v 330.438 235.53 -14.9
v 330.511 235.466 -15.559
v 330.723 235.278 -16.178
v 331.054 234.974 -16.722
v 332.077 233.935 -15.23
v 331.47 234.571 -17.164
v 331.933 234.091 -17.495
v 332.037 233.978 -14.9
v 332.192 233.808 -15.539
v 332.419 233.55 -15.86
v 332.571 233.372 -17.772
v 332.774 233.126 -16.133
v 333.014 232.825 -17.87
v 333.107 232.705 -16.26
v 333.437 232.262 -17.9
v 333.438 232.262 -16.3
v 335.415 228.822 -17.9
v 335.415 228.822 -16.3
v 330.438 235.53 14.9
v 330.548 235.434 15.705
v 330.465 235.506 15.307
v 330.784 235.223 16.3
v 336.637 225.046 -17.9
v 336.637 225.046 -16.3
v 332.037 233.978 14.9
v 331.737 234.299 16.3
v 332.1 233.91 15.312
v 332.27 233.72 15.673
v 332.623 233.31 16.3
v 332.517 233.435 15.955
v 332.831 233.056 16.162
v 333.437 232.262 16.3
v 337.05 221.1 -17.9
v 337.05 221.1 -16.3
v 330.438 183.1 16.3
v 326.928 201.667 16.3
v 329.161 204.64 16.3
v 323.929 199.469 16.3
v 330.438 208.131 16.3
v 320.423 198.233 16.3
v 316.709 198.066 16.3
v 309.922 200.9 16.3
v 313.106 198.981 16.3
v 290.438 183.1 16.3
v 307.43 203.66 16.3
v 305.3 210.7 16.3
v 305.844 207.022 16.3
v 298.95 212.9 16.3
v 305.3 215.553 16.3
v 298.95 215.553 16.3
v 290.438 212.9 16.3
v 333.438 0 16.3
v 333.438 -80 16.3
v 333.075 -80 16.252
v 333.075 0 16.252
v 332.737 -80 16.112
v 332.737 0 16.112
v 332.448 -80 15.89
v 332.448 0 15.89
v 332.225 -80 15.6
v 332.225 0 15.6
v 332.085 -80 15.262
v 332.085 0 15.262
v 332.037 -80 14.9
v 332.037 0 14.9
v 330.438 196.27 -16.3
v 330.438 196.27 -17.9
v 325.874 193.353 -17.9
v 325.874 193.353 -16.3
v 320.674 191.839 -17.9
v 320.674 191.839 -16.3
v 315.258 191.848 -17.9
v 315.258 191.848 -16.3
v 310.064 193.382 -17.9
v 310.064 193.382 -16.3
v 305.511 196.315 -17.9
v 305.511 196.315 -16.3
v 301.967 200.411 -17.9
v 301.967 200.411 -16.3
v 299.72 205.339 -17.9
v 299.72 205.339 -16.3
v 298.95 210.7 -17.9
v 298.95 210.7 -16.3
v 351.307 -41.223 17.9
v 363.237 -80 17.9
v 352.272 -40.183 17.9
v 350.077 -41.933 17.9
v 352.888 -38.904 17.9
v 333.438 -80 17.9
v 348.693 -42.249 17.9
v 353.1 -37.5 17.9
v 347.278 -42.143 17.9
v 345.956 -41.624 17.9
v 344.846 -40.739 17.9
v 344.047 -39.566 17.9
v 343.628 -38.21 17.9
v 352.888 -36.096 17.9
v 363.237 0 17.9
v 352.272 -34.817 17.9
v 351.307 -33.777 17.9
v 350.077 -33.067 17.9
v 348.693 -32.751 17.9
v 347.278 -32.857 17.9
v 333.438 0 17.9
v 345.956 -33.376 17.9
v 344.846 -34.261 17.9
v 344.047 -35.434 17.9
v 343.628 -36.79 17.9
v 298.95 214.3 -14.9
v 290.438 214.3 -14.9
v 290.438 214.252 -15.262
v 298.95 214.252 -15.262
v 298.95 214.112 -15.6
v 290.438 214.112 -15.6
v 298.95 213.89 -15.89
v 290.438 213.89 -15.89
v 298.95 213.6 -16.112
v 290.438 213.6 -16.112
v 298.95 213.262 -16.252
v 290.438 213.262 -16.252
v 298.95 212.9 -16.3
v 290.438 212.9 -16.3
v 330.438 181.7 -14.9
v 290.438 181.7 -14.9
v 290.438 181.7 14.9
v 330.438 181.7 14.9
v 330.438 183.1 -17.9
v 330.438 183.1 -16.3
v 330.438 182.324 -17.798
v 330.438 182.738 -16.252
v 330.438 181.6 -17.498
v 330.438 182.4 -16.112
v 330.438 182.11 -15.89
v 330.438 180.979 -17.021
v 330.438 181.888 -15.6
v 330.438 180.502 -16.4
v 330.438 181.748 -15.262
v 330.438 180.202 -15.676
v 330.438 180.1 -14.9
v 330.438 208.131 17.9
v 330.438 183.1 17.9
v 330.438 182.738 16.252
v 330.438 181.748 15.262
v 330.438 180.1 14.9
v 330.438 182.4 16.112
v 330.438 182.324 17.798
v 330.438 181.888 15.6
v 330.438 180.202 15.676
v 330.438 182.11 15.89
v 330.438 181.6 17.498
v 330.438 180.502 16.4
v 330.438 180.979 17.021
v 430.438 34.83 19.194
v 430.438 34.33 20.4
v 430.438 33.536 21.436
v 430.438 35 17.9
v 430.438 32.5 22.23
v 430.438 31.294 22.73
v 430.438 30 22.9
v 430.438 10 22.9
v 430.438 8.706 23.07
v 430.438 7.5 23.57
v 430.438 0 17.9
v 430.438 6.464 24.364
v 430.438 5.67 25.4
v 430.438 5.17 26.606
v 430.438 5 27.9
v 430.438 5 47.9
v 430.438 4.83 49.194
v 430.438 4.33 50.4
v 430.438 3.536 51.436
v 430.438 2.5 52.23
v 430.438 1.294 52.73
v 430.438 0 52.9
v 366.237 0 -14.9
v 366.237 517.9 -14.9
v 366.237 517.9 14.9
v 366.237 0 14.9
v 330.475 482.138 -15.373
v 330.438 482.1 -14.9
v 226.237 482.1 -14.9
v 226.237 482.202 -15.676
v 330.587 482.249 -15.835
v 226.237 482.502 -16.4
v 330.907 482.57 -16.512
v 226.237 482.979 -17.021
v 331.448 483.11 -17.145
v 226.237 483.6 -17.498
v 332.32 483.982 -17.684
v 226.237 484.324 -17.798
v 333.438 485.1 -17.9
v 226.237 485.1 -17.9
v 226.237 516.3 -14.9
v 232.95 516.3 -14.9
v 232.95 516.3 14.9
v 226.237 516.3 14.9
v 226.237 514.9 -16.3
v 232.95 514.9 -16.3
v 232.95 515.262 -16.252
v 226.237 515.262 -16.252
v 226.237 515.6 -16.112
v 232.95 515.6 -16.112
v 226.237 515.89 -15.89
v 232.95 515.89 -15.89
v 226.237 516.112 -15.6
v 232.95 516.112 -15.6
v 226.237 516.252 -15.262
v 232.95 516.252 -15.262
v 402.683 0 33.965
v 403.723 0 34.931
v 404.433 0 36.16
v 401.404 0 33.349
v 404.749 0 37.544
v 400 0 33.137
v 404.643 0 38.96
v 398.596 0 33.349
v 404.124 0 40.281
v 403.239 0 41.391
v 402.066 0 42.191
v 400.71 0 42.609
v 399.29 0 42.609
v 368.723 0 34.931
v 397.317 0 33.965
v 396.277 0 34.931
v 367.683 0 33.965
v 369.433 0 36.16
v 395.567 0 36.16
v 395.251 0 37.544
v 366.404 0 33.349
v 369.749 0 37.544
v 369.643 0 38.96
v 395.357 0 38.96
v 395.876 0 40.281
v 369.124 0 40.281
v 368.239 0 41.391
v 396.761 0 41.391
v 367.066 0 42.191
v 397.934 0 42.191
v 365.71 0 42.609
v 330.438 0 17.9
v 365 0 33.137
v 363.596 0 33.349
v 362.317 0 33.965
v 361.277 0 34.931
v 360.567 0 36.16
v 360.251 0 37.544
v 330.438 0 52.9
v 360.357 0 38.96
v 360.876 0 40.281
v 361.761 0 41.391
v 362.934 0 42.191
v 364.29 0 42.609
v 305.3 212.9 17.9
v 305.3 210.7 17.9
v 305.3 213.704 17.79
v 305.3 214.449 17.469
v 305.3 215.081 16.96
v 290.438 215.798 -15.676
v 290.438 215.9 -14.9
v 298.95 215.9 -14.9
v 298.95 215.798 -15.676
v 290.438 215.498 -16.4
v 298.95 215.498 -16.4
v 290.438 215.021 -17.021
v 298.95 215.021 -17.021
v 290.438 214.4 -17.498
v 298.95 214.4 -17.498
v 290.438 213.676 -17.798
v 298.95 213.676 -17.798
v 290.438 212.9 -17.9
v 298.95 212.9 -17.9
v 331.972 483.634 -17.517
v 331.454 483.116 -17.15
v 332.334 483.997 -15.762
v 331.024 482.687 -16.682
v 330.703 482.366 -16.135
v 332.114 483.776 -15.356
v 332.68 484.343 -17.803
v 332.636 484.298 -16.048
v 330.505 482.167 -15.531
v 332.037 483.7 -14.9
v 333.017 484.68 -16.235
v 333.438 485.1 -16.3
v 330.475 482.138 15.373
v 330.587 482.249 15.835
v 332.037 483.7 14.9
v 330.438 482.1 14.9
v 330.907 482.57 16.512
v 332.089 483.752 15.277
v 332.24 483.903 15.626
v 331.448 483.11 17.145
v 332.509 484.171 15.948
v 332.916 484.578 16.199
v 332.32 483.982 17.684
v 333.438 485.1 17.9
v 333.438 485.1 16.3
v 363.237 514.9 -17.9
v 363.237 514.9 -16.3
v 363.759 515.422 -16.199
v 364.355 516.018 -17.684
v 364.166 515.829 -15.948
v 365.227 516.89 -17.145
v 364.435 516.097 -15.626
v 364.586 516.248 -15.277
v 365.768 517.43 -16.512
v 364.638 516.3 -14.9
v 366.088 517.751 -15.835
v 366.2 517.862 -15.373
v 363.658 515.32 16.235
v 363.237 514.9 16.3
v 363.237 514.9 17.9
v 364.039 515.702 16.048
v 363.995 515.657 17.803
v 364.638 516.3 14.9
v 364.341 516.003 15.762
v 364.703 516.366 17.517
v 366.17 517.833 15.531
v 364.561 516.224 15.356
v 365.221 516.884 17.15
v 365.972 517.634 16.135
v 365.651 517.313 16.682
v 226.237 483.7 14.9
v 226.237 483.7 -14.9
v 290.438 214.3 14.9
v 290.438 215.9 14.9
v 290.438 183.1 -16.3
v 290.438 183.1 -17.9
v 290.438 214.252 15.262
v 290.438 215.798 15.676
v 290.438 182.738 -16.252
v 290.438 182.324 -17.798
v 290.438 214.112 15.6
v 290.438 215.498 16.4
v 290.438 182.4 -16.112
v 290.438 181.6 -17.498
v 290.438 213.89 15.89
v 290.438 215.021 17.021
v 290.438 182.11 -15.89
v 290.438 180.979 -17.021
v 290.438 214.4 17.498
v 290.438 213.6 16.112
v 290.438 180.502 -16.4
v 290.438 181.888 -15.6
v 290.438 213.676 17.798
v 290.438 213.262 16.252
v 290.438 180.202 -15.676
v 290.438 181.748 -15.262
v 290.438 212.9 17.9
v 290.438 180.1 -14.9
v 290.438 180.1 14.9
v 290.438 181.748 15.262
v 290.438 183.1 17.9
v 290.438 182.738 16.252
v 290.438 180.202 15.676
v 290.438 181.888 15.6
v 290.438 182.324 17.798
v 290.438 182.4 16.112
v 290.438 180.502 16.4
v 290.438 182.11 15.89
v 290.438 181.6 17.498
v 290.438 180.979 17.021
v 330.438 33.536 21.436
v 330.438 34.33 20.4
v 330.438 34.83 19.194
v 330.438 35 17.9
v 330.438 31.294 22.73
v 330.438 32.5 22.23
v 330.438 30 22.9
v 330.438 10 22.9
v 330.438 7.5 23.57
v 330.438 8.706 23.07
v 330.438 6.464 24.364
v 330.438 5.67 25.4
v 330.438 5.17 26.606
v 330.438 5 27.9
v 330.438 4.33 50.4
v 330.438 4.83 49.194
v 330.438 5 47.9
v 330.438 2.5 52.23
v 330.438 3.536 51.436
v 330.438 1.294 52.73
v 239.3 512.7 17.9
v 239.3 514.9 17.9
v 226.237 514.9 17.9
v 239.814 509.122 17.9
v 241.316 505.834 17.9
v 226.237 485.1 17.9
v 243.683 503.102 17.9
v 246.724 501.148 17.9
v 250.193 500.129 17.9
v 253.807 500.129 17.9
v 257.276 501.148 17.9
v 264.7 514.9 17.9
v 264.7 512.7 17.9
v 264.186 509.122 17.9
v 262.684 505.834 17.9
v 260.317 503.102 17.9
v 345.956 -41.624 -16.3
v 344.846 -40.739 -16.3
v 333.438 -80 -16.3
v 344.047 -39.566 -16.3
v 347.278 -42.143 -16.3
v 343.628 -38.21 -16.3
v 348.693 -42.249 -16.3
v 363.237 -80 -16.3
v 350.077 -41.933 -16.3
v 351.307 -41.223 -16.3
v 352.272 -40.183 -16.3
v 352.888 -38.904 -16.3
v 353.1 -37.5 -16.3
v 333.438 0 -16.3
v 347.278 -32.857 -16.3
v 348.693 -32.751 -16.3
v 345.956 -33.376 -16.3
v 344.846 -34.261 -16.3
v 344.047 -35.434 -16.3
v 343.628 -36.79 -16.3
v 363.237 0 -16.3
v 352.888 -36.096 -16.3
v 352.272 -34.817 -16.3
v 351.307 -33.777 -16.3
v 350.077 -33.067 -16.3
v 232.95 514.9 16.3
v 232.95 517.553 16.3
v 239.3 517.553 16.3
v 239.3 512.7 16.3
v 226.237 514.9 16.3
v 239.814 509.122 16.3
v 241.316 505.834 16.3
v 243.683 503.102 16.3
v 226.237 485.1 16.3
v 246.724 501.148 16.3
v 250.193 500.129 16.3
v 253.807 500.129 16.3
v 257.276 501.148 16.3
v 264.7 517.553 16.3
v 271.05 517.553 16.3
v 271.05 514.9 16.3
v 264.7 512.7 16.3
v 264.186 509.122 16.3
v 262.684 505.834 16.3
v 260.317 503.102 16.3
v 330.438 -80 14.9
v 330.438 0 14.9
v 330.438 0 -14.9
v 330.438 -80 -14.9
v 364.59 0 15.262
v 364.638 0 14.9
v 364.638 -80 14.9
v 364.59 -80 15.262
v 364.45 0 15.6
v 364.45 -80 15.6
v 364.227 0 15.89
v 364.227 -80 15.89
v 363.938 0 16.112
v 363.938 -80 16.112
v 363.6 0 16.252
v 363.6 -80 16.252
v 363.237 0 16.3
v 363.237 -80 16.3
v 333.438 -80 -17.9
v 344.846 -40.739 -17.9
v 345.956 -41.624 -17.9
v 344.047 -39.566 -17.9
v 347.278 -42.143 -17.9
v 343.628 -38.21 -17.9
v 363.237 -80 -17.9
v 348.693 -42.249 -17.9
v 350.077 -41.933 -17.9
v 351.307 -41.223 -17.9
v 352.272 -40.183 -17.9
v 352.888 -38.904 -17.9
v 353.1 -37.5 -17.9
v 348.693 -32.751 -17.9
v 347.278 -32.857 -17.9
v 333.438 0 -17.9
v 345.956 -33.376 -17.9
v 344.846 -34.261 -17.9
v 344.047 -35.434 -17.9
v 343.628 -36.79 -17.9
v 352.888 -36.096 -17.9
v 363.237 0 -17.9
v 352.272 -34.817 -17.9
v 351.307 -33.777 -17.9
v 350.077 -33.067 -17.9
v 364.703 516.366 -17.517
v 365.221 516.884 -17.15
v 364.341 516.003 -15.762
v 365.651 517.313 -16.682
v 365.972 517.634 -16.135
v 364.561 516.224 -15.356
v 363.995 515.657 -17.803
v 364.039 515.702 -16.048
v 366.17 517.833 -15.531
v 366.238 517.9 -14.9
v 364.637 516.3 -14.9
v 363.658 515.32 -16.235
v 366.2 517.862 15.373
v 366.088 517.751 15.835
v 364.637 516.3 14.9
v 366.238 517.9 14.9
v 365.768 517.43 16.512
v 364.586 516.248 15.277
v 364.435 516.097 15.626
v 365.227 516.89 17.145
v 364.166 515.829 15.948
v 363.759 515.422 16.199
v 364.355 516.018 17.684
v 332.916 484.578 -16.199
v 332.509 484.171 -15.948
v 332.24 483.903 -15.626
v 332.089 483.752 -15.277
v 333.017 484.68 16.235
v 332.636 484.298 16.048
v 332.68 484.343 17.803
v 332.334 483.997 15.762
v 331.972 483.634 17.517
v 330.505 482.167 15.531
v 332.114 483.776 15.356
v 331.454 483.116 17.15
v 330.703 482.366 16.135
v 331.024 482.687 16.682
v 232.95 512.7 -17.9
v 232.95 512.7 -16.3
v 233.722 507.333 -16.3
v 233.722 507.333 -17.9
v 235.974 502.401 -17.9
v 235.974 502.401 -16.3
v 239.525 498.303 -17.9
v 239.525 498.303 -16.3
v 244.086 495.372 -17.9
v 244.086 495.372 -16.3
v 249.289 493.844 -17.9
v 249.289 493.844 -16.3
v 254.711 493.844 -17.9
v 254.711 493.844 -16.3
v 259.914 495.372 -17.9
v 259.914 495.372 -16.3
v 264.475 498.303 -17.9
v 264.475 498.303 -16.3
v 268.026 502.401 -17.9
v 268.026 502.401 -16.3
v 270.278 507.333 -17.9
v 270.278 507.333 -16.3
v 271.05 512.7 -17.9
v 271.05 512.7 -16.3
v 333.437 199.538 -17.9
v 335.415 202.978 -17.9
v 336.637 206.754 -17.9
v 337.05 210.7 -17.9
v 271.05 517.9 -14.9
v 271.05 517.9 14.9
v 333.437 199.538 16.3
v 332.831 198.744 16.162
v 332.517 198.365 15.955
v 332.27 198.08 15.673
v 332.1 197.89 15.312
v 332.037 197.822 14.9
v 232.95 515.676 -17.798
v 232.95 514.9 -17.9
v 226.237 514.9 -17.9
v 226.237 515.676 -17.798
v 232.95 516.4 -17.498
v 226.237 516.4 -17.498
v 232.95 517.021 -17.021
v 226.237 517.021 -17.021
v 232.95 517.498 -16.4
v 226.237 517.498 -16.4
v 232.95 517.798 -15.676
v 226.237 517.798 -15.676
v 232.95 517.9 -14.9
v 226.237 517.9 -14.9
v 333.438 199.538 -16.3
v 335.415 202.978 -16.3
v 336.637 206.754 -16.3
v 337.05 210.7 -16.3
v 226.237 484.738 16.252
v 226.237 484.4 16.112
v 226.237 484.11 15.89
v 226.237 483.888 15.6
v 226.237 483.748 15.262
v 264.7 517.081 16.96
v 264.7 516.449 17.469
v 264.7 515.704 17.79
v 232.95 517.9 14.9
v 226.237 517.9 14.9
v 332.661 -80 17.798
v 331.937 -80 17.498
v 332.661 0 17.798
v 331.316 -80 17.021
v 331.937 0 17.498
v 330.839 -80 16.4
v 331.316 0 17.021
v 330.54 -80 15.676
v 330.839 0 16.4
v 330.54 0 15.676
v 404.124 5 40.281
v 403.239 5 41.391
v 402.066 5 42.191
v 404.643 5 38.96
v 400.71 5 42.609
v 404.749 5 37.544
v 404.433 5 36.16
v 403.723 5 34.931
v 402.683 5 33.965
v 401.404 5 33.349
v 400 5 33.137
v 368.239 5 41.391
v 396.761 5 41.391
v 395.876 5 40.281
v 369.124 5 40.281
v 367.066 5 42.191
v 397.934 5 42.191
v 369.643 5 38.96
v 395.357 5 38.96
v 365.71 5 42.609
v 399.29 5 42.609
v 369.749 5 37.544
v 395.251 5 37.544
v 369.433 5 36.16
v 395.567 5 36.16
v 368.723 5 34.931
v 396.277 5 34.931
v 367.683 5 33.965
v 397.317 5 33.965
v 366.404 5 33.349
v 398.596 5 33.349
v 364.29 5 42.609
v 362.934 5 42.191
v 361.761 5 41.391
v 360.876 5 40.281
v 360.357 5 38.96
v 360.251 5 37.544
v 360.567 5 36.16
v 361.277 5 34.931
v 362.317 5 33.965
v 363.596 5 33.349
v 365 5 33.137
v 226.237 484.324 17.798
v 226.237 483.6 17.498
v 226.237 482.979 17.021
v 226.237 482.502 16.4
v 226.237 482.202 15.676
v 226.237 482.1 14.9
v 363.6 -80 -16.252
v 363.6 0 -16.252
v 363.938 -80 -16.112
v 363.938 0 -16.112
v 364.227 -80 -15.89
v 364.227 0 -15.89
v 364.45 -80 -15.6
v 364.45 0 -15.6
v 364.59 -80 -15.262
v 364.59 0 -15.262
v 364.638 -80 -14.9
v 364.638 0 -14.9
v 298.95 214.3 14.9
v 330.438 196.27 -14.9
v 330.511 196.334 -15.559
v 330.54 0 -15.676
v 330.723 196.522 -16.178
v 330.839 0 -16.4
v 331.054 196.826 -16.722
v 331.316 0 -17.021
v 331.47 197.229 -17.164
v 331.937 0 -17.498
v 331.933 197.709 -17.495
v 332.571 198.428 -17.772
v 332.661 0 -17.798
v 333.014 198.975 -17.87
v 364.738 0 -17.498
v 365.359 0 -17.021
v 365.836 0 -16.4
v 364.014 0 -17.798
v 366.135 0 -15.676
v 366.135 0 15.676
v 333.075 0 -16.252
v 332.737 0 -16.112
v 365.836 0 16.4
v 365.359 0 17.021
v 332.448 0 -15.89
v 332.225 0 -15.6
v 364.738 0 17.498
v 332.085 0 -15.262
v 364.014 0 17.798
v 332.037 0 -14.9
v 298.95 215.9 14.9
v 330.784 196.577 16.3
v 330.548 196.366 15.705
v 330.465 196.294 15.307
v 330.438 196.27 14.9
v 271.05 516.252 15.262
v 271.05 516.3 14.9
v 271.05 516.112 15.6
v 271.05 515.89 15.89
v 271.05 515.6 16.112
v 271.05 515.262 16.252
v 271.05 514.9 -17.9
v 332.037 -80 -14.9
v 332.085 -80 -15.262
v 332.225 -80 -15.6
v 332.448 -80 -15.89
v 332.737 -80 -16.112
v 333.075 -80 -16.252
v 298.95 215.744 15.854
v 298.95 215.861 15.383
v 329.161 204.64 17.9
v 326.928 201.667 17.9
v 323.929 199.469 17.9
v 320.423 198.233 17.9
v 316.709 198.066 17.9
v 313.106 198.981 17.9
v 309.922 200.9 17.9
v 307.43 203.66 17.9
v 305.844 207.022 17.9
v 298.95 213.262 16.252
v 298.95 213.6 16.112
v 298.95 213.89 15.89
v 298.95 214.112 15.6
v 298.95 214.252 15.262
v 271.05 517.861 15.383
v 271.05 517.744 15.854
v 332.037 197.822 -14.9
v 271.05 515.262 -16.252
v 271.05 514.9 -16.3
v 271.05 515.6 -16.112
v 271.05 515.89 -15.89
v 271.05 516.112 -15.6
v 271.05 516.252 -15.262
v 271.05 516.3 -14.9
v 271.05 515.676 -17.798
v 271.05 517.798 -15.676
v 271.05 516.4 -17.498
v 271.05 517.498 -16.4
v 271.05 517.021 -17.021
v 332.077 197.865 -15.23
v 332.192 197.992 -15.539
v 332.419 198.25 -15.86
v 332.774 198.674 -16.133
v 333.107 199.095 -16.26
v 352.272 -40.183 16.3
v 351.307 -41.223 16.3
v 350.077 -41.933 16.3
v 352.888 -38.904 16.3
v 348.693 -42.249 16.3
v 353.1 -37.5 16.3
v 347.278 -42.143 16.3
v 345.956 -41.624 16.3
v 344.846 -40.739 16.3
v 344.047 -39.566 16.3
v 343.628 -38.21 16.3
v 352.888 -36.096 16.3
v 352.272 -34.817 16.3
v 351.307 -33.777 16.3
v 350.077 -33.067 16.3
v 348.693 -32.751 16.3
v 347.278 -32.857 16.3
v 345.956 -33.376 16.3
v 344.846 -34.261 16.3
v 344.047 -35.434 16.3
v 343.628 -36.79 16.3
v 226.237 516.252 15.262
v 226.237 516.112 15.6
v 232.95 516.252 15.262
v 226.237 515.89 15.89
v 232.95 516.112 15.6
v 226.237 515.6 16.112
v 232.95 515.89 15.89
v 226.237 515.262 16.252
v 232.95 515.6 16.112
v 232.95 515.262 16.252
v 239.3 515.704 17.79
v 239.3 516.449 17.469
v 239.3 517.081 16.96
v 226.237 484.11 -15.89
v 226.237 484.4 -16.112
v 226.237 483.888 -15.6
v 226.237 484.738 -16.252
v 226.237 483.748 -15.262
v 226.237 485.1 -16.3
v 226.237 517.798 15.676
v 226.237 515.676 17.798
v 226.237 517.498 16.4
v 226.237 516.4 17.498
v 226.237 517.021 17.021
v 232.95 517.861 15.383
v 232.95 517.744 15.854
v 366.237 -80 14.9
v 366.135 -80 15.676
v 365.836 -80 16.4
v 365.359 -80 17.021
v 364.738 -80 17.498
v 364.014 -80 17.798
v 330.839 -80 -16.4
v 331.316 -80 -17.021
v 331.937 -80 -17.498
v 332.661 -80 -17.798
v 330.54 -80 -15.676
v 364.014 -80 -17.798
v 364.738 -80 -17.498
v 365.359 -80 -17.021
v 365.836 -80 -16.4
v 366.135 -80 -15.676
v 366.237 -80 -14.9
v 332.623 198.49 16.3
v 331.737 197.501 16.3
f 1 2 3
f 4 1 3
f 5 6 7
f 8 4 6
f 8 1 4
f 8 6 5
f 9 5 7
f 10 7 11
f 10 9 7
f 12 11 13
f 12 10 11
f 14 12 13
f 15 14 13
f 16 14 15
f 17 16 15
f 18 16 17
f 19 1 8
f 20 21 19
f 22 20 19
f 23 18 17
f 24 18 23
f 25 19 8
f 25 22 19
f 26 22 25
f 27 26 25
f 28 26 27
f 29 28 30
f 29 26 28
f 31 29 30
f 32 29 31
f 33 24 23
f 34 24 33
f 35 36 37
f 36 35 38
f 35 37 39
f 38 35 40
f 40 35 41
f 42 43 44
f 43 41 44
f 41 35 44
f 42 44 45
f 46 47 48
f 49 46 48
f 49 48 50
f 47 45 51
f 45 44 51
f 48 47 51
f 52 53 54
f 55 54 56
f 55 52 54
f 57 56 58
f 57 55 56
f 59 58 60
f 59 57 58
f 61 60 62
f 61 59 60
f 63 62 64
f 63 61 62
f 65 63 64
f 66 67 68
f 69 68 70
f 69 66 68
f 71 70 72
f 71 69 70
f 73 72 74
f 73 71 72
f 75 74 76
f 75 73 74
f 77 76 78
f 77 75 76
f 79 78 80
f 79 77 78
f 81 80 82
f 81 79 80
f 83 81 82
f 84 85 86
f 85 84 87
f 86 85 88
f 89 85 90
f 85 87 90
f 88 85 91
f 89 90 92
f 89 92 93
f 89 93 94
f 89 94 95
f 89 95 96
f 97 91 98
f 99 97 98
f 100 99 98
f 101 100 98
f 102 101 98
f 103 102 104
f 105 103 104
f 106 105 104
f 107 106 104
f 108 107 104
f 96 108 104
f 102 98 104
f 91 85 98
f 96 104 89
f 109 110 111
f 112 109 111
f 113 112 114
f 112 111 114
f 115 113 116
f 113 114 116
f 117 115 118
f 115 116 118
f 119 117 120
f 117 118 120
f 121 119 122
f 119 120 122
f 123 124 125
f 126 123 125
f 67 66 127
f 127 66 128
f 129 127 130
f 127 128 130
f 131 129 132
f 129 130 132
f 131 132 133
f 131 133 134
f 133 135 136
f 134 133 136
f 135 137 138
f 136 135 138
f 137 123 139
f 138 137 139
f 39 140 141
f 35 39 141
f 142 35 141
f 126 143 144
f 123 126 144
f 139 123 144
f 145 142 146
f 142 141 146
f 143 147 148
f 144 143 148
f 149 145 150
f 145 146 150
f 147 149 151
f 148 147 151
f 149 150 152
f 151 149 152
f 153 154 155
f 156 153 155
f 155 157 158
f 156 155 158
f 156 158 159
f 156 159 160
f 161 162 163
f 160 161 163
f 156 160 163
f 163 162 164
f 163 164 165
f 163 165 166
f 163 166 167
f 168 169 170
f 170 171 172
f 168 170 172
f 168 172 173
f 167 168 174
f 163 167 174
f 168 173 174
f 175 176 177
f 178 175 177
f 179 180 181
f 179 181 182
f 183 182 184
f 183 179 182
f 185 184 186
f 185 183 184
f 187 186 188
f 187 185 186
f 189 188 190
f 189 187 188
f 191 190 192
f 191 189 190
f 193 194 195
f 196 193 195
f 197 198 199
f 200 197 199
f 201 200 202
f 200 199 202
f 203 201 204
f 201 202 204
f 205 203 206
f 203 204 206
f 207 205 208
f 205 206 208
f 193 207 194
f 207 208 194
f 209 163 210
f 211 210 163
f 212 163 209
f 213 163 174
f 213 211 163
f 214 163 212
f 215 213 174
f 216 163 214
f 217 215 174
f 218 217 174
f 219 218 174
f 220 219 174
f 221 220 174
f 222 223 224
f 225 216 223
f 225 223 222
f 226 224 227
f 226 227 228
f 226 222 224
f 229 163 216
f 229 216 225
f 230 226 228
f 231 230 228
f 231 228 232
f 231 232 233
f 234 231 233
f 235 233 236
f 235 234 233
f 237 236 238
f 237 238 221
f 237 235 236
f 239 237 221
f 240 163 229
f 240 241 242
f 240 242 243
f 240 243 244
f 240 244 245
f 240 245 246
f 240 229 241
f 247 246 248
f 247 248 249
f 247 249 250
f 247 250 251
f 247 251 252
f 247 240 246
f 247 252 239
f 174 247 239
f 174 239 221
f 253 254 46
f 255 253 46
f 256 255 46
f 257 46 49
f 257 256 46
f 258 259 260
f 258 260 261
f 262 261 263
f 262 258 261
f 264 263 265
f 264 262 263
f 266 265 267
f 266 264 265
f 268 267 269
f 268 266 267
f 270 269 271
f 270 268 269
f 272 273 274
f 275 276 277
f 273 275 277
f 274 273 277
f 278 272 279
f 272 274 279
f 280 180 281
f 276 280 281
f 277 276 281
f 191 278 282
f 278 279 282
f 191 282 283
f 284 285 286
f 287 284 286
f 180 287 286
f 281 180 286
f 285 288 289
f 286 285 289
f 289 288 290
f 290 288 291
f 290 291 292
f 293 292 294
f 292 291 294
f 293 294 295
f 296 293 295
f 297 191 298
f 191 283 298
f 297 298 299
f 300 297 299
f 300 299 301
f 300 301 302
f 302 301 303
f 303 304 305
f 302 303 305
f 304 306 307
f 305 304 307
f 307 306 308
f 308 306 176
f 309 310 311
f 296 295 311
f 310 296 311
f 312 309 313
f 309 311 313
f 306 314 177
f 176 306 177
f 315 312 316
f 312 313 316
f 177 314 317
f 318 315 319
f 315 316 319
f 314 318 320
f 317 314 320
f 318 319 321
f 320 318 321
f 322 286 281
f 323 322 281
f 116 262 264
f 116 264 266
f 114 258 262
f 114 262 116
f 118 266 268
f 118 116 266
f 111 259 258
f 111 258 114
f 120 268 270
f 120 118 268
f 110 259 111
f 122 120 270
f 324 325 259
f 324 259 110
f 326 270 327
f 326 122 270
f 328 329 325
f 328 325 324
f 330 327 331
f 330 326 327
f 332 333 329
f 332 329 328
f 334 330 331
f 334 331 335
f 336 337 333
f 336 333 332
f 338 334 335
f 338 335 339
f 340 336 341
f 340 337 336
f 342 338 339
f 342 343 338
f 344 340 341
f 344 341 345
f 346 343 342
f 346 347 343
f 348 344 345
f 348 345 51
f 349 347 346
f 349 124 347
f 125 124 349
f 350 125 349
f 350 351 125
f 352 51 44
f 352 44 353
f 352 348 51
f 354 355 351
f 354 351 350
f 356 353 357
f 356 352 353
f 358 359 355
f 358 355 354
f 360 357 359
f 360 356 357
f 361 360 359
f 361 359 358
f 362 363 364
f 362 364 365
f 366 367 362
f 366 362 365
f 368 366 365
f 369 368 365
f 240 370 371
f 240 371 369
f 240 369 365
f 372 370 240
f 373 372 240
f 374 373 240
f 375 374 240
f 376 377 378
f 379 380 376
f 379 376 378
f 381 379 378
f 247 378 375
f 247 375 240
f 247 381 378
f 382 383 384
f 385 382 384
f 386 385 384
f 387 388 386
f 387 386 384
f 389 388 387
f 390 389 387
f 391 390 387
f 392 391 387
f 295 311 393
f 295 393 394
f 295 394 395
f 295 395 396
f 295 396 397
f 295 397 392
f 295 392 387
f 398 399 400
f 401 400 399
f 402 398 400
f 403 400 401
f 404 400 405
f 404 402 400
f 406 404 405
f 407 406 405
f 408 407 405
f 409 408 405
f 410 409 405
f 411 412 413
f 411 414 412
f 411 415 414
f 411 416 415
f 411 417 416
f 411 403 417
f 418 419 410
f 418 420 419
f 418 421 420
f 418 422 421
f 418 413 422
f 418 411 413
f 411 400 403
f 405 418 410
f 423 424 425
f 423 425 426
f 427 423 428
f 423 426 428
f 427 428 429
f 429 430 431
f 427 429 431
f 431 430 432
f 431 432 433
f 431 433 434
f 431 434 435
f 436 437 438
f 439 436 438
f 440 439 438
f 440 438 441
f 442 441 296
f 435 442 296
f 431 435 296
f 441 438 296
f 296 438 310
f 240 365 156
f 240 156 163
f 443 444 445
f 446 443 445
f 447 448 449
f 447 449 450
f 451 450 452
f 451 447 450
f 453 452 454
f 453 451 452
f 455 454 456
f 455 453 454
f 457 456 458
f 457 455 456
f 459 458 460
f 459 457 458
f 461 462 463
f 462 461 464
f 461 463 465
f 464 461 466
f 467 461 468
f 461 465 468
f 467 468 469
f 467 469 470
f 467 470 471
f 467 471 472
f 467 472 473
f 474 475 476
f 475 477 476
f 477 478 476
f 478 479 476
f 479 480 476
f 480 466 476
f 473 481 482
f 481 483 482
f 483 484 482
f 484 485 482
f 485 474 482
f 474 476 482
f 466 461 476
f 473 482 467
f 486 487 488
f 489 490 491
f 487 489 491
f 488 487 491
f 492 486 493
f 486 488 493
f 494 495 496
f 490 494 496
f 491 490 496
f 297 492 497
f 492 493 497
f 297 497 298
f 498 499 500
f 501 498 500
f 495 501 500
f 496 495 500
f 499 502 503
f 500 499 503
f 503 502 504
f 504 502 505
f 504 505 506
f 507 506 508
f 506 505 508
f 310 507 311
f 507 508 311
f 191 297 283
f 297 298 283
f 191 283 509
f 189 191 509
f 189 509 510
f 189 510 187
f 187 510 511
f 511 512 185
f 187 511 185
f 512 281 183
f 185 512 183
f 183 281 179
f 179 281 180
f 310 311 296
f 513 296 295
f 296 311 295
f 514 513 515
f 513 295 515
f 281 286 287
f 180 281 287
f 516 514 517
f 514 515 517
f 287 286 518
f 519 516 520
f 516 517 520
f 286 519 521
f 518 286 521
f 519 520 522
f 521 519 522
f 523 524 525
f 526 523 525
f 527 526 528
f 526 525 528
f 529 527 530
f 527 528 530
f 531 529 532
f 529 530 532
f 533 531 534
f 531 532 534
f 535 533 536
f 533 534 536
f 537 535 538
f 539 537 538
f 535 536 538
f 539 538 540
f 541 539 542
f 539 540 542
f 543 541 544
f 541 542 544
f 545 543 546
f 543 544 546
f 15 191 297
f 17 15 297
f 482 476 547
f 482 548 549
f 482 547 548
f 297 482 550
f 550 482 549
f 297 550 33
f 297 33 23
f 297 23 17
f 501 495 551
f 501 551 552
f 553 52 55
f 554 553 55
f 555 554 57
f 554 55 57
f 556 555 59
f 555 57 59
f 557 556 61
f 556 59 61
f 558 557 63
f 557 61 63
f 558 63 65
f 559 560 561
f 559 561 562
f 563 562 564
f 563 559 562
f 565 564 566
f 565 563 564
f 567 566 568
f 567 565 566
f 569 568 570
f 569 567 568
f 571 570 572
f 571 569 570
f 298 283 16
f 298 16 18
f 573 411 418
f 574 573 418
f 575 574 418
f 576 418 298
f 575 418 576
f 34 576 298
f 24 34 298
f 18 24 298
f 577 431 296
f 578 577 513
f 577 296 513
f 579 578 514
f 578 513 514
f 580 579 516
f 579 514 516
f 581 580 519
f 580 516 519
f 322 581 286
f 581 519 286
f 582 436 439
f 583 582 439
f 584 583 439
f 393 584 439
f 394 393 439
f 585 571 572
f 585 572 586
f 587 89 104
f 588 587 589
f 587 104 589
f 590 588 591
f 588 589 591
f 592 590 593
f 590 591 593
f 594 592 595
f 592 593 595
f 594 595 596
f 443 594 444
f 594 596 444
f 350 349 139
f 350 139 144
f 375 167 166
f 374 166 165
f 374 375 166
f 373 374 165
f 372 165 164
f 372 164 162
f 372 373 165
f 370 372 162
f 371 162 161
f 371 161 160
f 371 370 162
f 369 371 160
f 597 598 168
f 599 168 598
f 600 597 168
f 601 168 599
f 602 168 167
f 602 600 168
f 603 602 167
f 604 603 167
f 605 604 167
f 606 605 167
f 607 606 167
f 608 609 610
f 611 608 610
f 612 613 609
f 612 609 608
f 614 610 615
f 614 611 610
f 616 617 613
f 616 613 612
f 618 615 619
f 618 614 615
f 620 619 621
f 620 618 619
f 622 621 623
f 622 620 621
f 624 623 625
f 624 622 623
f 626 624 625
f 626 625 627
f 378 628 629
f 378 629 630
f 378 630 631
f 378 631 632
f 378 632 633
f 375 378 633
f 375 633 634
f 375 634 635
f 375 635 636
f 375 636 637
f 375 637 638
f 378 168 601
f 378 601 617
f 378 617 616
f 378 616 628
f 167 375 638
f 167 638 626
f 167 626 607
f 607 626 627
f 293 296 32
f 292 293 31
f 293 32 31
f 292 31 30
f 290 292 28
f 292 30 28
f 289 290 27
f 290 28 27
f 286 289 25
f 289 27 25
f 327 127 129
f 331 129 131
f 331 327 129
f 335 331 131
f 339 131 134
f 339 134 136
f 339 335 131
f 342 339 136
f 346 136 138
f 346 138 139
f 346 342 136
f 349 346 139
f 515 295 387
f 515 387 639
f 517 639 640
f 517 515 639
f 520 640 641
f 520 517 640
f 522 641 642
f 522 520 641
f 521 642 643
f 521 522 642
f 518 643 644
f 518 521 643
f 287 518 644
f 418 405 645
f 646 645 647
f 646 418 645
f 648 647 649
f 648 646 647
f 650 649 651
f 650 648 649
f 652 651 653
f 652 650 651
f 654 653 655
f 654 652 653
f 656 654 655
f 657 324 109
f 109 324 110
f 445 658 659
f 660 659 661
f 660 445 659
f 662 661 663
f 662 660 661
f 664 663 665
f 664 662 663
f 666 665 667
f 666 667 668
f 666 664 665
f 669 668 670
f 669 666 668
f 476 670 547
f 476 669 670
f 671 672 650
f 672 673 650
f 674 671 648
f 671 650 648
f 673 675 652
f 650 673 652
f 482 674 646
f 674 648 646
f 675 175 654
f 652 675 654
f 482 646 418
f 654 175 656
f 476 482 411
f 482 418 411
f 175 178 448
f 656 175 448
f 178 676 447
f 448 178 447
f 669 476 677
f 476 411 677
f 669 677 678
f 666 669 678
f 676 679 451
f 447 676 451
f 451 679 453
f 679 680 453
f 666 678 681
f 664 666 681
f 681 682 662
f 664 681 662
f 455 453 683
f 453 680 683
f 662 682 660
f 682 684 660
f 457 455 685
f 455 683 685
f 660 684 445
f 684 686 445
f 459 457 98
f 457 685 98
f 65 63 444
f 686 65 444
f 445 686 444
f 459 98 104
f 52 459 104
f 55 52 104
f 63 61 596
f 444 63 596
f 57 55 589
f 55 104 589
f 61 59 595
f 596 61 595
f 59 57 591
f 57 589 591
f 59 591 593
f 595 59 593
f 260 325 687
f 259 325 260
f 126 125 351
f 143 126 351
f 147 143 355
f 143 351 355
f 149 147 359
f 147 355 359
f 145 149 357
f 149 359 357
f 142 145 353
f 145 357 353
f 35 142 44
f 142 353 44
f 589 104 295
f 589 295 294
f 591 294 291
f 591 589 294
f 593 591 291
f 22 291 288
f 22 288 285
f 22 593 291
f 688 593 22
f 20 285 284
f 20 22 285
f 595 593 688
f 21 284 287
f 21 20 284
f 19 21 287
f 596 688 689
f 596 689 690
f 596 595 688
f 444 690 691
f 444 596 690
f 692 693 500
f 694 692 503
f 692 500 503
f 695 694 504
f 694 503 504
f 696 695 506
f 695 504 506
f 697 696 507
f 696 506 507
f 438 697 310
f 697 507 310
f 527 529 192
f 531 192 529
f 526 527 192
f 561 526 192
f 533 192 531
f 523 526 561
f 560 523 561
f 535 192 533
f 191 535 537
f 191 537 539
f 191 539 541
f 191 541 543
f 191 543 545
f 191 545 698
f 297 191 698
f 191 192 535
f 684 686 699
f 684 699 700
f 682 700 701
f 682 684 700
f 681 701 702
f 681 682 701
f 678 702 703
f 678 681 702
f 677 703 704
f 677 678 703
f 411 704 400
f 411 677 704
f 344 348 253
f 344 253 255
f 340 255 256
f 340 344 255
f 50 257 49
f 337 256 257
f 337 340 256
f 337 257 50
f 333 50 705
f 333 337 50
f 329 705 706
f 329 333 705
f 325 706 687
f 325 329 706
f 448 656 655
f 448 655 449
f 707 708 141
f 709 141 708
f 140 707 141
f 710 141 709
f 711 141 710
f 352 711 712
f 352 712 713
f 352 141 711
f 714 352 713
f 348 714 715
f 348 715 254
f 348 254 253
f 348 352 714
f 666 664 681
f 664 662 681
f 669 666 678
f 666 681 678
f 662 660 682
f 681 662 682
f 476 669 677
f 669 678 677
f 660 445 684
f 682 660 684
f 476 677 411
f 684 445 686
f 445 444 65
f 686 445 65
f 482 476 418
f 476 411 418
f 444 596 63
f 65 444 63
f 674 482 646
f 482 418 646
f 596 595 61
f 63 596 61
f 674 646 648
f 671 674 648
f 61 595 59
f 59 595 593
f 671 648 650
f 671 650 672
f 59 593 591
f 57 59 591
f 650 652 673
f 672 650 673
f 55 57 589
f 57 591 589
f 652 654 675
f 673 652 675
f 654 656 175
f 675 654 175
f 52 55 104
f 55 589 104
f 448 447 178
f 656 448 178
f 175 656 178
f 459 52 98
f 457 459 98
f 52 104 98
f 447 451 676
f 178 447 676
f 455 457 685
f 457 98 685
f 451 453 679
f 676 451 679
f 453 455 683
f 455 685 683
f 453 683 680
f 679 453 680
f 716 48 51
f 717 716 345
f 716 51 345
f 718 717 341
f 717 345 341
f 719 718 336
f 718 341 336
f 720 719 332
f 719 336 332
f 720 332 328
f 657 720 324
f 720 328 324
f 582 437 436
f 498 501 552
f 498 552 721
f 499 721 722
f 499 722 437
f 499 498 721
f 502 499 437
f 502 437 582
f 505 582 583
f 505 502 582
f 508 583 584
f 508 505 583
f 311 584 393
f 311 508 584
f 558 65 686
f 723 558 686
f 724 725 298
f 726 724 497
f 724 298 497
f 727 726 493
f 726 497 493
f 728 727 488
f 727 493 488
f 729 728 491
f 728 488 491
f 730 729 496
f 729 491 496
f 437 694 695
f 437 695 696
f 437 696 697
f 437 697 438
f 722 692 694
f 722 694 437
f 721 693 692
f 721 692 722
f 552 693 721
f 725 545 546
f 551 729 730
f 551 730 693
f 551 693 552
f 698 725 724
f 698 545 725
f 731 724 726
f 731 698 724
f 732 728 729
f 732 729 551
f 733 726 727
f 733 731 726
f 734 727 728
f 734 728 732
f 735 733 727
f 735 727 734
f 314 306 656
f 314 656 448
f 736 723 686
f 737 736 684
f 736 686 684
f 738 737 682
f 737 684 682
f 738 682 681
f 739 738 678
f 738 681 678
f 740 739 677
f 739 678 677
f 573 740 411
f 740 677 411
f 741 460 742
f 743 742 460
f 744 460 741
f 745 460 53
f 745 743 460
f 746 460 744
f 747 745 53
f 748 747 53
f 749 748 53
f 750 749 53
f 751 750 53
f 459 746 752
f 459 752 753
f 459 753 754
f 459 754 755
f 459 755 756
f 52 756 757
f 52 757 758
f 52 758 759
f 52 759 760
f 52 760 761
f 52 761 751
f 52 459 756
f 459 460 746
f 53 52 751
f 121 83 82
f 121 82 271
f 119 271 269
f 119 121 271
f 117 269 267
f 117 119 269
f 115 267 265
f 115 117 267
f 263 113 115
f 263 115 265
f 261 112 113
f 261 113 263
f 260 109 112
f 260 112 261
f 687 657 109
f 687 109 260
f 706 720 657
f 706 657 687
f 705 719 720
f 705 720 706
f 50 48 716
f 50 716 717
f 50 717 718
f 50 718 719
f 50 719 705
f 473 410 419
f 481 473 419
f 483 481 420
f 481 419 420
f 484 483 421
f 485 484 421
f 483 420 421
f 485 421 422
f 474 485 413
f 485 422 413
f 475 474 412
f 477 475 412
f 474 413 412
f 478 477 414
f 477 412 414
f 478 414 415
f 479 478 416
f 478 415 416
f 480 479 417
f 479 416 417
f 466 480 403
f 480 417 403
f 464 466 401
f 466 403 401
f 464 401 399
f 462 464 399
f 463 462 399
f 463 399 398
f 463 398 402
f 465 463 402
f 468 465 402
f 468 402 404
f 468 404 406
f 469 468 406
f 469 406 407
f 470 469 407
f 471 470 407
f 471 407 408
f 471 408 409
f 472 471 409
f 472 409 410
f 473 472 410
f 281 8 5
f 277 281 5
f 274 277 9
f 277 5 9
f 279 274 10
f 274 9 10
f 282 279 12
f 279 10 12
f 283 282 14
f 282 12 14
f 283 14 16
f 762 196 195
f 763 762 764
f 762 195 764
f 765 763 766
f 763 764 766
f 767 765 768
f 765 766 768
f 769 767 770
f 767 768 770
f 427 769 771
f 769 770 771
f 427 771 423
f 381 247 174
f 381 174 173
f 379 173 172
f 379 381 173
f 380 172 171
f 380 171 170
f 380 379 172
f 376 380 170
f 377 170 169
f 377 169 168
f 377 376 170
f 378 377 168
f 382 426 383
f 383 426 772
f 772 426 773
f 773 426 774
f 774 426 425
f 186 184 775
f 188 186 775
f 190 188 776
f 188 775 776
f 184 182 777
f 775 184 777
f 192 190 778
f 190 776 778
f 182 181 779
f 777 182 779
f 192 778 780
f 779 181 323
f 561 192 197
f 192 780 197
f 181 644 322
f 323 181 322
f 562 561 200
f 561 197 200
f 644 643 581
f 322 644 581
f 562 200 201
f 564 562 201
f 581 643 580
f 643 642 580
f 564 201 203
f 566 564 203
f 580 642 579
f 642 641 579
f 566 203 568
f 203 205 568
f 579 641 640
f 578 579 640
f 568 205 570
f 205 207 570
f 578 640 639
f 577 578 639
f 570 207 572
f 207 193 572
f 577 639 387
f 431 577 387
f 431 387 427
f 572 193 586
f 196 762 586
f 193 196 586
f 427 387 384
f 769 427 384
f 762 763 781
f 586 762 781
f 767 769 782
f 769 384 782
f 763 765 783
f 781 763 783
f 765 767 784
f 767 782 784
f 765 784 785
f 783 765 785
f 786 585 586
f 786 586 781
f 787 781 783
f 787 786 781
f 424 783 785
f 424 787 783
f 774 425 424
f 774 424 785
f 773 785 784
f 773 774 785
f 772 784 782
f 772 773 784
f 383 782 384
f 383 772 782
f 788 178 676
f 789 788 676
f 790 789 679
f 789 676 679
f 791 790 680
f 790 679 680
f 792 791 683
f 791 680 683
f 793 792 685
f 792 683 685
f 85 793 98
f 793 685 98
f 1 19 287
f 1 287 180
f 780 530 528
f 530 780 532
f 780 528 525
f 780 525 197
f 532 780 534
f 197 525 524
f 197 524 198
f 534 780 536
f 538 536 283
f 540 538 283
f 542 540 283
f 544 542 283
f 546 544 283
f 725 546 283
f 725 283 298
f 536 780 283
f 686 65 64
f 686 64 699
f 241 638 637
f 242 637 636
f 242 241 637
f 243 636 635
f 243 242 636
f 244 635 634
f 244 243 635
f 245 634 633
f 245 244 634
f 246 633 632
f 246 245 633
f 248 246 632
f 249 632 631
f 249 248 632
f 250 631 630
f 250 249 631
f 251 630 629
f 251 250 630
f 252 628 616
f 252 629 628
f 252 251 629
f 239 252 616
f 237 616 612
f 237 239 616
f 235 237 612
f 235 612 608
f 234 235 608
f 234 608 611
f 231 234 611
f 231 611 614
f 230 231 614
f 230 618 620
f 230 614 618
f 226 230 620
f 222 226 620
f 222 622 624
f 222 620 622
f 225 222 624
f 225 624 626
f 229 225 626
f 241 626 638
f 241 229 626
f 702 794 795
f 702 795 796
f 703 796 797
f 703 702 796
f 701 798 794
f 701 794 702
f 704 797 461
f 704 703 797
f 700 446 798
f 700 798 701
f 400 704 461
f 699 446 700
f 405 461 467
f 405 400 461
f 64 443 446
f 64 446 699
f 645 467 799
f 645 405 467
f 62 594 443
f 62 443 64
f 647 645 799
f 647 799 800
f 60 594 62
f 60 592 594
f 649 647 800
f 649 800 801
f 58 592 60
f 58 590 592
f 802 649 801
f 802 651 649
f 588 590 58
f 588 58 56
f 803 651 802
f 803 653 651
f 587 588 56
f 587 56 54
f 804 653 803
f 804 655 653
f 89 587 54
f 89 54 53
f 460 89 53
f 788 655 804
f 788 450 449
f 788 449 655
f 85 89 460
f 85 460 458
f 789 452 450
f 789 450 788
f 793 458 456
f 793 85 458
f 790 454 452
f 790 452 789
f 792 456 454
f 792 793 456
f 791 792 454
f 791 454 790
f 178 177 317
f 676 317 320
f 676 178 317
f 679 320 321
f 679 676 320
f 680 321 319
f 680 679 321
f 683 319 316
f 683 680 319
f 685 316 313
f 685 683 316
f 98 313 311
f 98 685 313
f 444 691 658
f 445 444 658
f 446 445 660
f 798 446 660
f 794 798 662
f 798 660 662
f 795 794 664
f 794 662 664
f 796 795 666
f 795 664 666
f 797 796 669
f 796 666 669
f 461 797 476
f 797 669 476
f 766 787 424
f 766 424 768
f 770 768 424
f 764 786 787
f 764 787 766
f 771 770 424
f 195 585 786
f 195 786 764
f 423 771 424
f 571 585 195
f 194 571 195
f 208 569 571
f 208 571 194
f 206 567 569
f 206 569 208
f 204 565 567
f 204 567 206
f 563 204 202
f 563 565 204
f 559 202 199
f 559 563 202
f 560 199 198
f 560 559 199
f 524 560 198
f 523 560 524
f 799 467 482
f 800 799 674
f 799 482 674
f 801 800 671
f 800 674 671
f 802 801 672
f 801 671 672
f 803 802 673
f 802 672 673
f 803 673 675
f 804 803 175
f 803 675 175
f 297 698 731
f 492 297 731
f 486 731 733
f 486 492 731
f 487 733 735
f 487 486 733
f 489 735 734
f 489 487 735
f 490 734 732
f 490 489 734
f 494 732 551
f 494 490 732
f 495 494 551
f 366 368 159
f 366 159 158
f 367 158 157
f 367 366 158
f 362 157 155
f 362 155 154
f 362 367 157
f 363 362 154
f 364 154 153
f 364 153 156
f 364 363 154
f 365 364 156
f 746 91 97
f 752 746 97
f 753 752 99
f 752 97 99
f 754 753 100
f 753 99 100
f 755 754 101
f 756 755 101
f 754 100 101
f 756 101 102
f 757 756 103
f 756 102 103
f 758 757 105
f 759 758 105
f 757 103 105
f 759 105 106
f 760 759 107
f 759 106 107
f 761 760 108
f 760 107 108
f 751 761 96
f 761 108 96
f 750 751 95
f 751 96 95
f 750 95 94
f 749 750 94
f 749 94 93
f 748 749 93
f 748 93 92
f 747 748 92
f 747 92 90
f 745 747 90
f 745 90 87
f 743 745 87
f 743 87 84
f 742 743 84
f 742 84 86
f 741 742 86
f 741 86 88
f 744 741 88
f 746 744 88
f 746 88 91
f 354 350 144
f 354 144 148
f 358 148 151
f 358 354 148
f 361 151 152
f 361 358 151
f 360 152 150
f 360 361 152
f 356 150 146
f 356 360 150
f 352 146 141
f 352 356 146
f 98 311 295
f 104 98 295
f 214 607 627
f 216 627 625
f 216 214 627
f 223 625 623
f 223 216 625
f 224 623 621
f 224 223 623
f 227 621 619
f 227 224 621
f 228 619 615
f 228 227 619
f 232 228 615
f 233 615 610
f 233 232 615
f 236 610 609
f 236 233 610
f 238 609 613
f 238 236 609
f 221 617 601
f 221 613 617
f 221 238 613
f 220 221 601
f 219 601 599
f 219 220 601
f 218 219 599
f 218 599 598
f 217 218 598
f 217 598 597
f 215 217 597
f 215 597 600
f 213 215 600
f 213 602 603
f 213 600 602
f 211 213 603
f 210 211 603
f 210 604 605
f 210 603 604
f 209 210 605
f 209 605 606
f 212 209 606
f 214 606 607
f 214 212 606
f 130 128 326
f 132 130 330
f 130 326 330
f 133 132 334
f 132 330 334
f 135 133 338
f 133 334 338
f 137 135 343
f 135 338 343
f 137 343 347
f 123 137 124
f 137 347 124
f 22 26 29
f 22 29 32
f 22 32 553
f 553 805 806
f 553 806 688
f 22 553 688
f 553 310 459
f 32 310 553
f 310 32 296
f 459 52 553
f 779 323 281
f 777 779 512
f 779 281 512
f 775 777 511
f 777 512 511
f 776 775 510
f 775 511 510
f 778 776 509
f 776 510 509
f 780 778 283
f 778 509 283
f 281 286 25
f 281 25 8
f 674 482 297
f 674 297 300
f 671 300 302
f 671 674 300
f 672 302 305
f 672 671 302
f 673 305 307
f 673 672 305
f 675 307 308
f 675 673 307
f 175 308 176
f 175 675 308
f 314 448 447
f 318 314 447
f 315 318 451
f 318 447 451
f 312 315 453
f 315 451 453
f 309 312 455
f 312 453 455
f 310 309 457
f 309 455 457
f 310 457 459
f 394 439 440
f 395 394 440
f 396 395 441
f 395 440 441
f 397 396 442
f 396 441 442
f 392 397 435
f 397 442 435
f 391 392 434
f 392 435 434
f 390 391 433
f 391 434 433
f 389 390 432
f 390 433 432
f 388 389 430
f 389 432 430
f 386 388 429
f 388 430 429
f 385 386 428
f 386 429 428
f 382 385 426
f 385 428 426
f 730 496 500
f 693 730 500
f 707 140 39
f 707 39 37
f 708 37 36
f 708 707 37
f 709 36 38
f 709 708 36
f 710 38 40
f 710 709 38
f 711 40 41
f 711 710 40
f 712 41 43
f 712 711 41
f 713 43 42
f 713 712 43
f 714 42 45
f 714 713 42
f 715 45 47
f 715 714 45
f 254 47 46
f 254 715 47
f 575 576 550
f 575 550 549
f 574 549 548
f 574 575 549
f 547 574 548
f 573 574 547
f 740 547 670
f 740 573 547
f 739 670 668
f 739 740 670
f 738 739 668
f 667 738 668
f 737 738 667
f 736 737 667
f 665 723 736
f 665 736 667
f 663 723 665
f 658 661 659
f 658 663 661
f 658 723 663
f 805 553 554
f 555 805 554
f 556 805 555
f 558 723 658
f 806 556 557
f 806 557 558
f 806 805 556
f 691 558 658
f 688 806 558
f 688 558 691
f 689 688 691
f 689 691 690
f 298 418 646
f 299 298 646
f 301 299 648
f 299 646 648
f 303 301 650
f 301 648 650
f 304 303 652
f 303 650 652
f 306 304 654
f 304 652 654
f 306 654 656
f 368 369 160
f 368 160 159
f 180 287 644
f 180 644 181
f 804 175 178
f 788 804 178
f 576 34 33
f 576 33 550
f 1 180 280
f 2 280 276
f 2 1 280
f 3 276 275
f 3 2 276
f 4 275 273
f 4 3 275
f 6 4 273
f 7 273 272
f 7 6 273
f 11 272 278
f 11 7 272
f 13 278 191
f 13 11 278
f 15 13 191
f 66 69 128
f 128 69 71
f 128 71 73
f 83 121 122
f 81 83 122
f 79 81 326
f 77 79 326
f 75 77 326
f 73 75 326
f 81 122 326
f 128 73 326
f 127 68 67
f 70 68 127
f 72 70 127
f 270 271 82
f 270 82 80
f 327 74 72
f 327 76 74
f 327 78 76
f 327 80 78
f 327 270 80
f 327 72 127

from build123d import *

# Parameters (mm, degrees)
STRUCTURAL_MEMBERMAIN_DEPTH                   = 1
STRUCTURAL_MEMBERMAIN_DEPTH_BACK              = 80
STRUCTURAL_MEMBERMAIN_2_DEPTH                 = 527.314422766
STRUCTURAL_MEMBERMAIN_3_DEPTH                 = 148.414422766
STRUCTURAL_MEMBERMAIN_4_DEPTH                 = 58.9
CUT_EXTRUDETOPRAILGUIDE_DEPTH                 = 635.563414015
CUT_EXTRUDETOPRAILGUIDE_DEPTH_BACK            = 635.563414015
STRUCTURAL_MEMBERANGLE_DEPTH                  = 100
SKETCH15_R                                    = 4.7625
CUT_EXTRUDEMOUNTINGHOLES_DEPTH                = 676.49630747
CUT_EXTRUDEENLARGERAILGUIDE_DEPTH             = 676.49630747
CUT_EXTRUDEENLARGERAILGUIDE_DIRECTION_2_REACH = 677.496
CUT_EXTRUDE2_DEPTH                            = 675.372665079
SKETCH19_R                                    = 4.7625
CUT_EXTRUDE3_DEPTH                            = 675.372665085
CUT_EXTRUDE4_START                            = -34.2
CUT_EXTRUDE4_DEPTH                            = 34.2


with BuildPart() as part:
    # Sketch11 → Structural MemberMain (new, two sides)
    with BuildSketch(Plane(origin=(348.3375, 0, 0), x_dir=(-1, 0, 0), z_dir=(0, 1, 0))) as structural_membermain_sk:
        with BuildLine():
            Line((-14.9, 17.9), (14.9, 17.9))
            ThreePointArc((14.9, 17.9), (17.021320344, 17.021320344), (17.9, 14.9))
            Line((17.9, 14.9), (17.9, -14.9))
            ThreePointArc((17.9, -14.9), (17.021320344, -17.021320344), (14.9, -17.9))
            Line((14.9, -17.9), (-14.9, -17.9))
            ThreePointArc((-14.9, -17.9), (-17.021320344, -17.021320344), (-17.9, -14.9))
            Line((-17.9, -14.9), (-17.9, 14.9))
            ThreePointArc((-17.9, 14.9), (-17.021320344, 17.021320344), (-14.9, 17.9))
        make_face()
        with BuildLine():
            Line((-14.9, 16.3), (14.9, 16.3))
            ThreePointArc((14.9, 16.3), (15.889949494, 15.889949494), (16.3, 14.9))
            Line((16.3, 14.9), (16.3, -14.9))
            ThreePointArc((16.3, -14.9), (15.889949494, -15.889949494), (14.9, -16.3))
            Line((14.9, -16.3), (-14.9, -16.3))
            ThreePointArc((-14.9, -16.3), (-15.889949494, -15.889949494), (-16.3, -14.9))
            Line((-16.3, -14.9), (-16.3, 14.9))
            ThreePointArc((-16.3, 14.9), (-15.889949494, 15.889949494), (-14.9, 16.3))
        make_face(mode=Mode.SUBTRACT)
    extrude(amount=STRUCTURAL_MEMBERMAIN_DEPTH)
    extrude(structural_membermain_sk.sketch, amount=-STRUCTURAL_MEMBERMAIN_DEPTH_BACK)

    # Structural MemberMain mitre 1
    split(bisect_by=Plane(origin=(348.3375, 0, 0), x_dir=(1, 0, 0), z_dir=(0, -1, 0)), keep=Keep.TOP)

    # Sketch19 → Cut-Extrude3 (cut, through all)
    with BuildSketch(Plane.XY.offset(17.9)):
        with Locations((348.3375, -37.5)):
            Circle(SKETCH19_R)
    extrude(amount=-CUT_EXTRUDE3_DEPTH, mode=Mode.SUBTRACT)


with BuildPart() as body_2:
    # Sketch11 on segment 2 (carried to segment 2) → Structural MemberMain 2 (new body)
    with BuildSketch(Plane(origin=(348.3375, -1, 0), x_dir=(-1, 0, 0), z_dir=(0, 1, 0))):
        with BuildLine():
            Line((-14.9, 17.9), (14.9, 17.9))
            ThreePointArc((14.9, 17.9), (17.021320344, 17.021320344), (17.9, 14.9))
            Line((17.9, 14.9), (17.9, -14.9))
            ThreePointArc((17.9, -14.9), (17.021320344, -17.021320344), (14.9, -17.9))
            Line((14.9, -17.9), (-14.9, -17.9))
            ThreePointArc((-14.9, -17.9), (-17.021320344, -17.021320344), (-17.9, -14.9))
            Line((-17.9, -14.9), (-17.9, 14.9))
            ThreePointArc((-17.9, 14.9), (-17.021320344, 17.021320344), (-14.9, 17.9))
        make_face()
        with BuildLine():
            Line((-14.9, 16.3), (14.9, 16.3))
            ThreePointArc((14.9, 16.3), (15.889949494, 15.889949494), (16.3, 14.9))
            Line((16.3, 14.9), (16.3, -14.9))
            ThreePointArc((16.3, -14.9), (15.889949494, -15.889949494), (14.9, -16.3))
            Line((14.9, -16.3), (-14.9, -16.3))
            ThreePointArc((-14.9, -16.3), (-15.889949494, -15.889949494), (-16.3, -14.9))
            Line((-16.3, -14.9), (-16.3, 14.9))
            ThreePointArc((-16.3, 14.9), (-15.889949494, 15.889949494), (-14.9, 16.3))
        make_face(mode=Mode.SUBTRACT)
    extrude(amount=STRUCTURAL_MEMBERMAIN_2_DEPTH)

    # Structural MemberMain 2 mitre 1
    split(bisect_by=Plane(origin=(348.3375, 0, 0), x_dir=(-1, 0, 0), z_dir=(0, 1, 0)), keep=Keep.TOP)

    # Structural MemberMain 2 mitre 2
    split(bisect_by=Plane(origin=(348.3375, 500, 0), x_dir=(0.707106781, 0.707106781, 0), z_dir=(0.707106781, -0.707106781, 0)), keep=Keep.TOP)


with BuildPart() as body_3:
    # Sketch11 on segment 3 (carried to segment 3) → Structural MemberMain 3 (new body)
    with BuildSketch(Plane(origin=(374.651922766, 500, 0), x_dir=(0, -1, 0), z_dir=(-1, 0, 0))):
        with BuildLine():
            Line((-14.9, 17.9), (14.9, 17.9))
            ThreePointArc((14.9, 17.9), (17.021320344, 17.021320344), (17.9, 14.9))
            Line((17.9, 14.9), (17.9, -14.9))
            ThreePointArc((17.9, -14.9), (17.021320344, -17.021320344), (14.9, -17.9))
            Line((14.9, -17.9), (-14.9, -17.9))
            ThreePointArc((-14.9, -17.9), (-17.021320344, -17.021320344), (-17.9, -14.9))
            Line((-17.9, -14.9), (-17.9, 14.9))
            ThreePointArc((-17.9, 14.9), (-17.021320344, 17.021320344), (-14.9, 17.9))
        make_face()
        with BuildLine():
            Line((-14.9, 16.3), (14.9, 16.3))
            ThreePointArc((14.9, 16.3), (15.889949494, 15.889949494), (16.3, 14.9))
            Line((16.3, 14.9), (16.3, -14.9))
            ThreePointArc((16.3, -14.9), (15.889949494, -15.889949494), (14.9, -16.3))
            Line((14.9, -16.3), (-14.9, -16.3))
            ThreePointArc((-14.9, -16.3), (-15.889949494, -15.889949494), (-16.3, -14.9))
            Line((-16.3, -14.9), (-16.3, 14.9))
            ThreePointArc((-16.3, 14.9), (-15.889949494, 15.889949494), (-14.9, 16.3))
        make_face(mode=Mode.SUBTRACT)
    extrude(amount=STRUCTURAL_MEMBERMAIN_3_DEPTH)

    # Structural MemberMain 3 mitre 1
    split(bisect_by=Plane(origin=(348.3375, 500, 0), x_dir=(-0.707106781, -0.707106781, 0), z_dir=(-0.707106781, 0.707106781, 0)), keep=Keep.TOP)

    # Sketch12 → Cut-ExtrudeTopRailGuide (cut, two sides)
    with BuildSketch(Plane.XY) as cut_extrudetoprailguide_sk:
        with BuildLine():
            Line((239.3, 512.7), (239.3, 523.1))
            ThreePointArc((239.3, 523.1), (252, 535.8), (264.7, 523.1))
            Line((264.7, 523.1), (264.7, 512.7))
            ThreePointArc((264.7, 512.7), (252, 500), (239.3, 512.7))
        make_face()
    extrude(amount=CUT_EXTRUDETOPRAILGUIDE_DEPTH, mode=Mode.SUBTRACT)
    extrude(cut_extrudetoprailguide_sk.sketch, amount=-CUT_EXTRUDETOPRAILGUIDE_DEPTH_BACK, mode=Mode.SUBTRACT)

    # Sketch16 → Cut-ExtrudeEnlargeRailGuide (cut)
    with BuildSketch(Plane.XY):
        with BuildLine():
            Line((271.05, 512.7), (271.05, 523.1))
            ThreePointArc((271.05, 523.1), (252, 542.15), (232.95, 523.1))
            Line((232.95, 523.1), (232.95, 512.7))
            ThreePointArc((232.95, 512.7), (252, 493.65), (271.05, 512.7))
        make_face()
    extrude(amount=-CUT_EXTRUDEENLARGERAILGUIDE_DEPTH, mode=Mode.SUBTRACT)

    # Cut-ExtrudeEnlargeRailGuide direction 2: up to this face of the body (flat: up to its plane)
    cut_extrudeenlargerailguide_direction_2_end = Plane(body_3.part.faces().sort_by_distance((290.896237065, 499.874495333, 16.3))[0])
    # Sketch16 → Cut-ExtrudeEnlargeRailGuide direction 2 (cut, up to the picked face)
    with BuildSketch(Plane.XY, mode=Mode.PRIVATE) as cut_extrudeenlargerailguide_direction_2_sk1:
        with BuildLine():
            Line((271.05, 512.7), (271.05, 523.1))
            ThreePointArc((271.05, 523.1), (252, 542.15), (232.95, 523.1))
            Line((232.95, 523.1), (232.95, 512.7))
            ThreePointArc((232.95, 512.7), (252, 493.65), (271.05, 512.7))
        make_face()
    cut_extrudeenlargerailguide_direction_2_tool1 = split(extrude(cut_extrudeenlargerailguide_direction_2_sk1.sketch, amount=CUT_EXTRUDEENLARGERAILGUIDE_DIRECTION_2_REACH, mode=Mode.PRIVATE), bisect_by=cut_extrudeenlargerailguide_direction_2_end, keep=Keep.BOTH, mode=Mode.PRIVATE)
    add(cut_extrudeenlargerailguide_direction_2_tool1.solids().sort_by(Axis((252, 517.9, 0), (0, 0, 1)))[0], mode=Mode.SUBTRACT)


with BuildPart() as body_4:
    # Sketch11 on segment 4 (carried to segment 4) → Structural MemberMain 4 (new body)
    with BuildSketch(Plane(origin=(290.4375, 198, 0), x_dir=(0, 1, 0), z_dir=(1, 0, 0))):
        with BuildLine():
            Line((-14.9, 17.9), (14.9, 17.9))
            ThreePointArc((14.9, 17.9), (17.021320344, 17.021320344), (17.9, 14.9))
            Line((17.9, 14.9), (17.9, -14.9))
            ThreePointArc((17.9, -14.9), (17.021320344, -17.021320344), (14.9, -17.9))
            Line((14.9, -17.9), (-14.9, -17.9))
            ThreePointArc((-14.9, -17.9), (-17.021320344, -17.021320344), (-17.9, -14.9))
            Line((-17.9, -14.9), (-17.9, 14.9))
            ThreePointArc((-17.9, 14.9), (-17.021320344, 17.021320344), (-14.9, 17.9))
        make_face()
        with BuildLine():
            Line((-14.9, 16.3), (14.9, 16.3))
            ThreePointArc((14.9, 16.3), (15.889949494, 15.889949494), (16.3, 14.9))
            Line((16.3, 14.9), (16.3, -14.9))
            ThreePointArc((16.3, -14.9), (15.889949494, -15.889949494), (14.9, -16.3))
            Line((14.9, -16.3), (-14.9, -16.3))
            ThreePointArc((-14.9, -16.3), (-15.889949494, -15.889949494), (-16.3, -14.9))
            Line((-16.3, -14.9), (-16.3, 14.9))
            ThreePointArc((-16.3, 14.9), (-15.889949494, 15.889949494), (-14.9, 16.3))
        make_face(mode=Mode.SUBTRACT)
    extrude(amount=STRUCTURAL_MEMBERMAIN_4_DEPTH)

    # Structural MemberMain 4 mitre 1
    split(bisect_by=Plane(origin=(330.4375, 198, 0), x_dir=(0, -1, 0), z_dir=(-1, 0, 0)), keep=Keep.TOP)


with BuildPart() as body_5:
    # Sketch14 → Structural MemberAngle (new body)
    with BuildSketch(Plane(origin=(330.4375, 0, 17.9), x_dir=(0, 1, 0), z_dir=(1, 0, 0))):
        with BuildLine():
            Line((0, 0), (0, 35))
            ThreePointArc((0, 35), (3.535533906, 33.535533906), (5, 30))
            Line((5, 30), (5, 10))
            ThreePointArc((5, 10), (6.464466094, 6.464466094), (10, 5))
            Line((10, 5), (30, 5))
            ThreePointArc((30, 5), (33.535533906, 3.535533906), (35, 0))
            Line((35, 0), (0, 0))
        make_face()
    extrude(amount=STRUCTURAL_MEMBERANGLE_DEPTH)

    # Sketch15 → Cut-ExtrudeMountingHoles (cut, through all)
    with BuildSketch(Plane(origin=(0, 0, 0), x_dir=(1, 0, 0), z_dir=(0, 1, 0))):
        with Locations(Location((365, -37.9, 0), (0, 0, 90))):
            Circle(SKETCH15_R)
        with Locations(Location((400, -37.9, 0), (0, 0, 90))):
            Circle(SKETCH15_R)
    extrude(amount=CUT_EXTRUDEMOUNTINGHOLES_DEPTH, mode=Mode.SUBTRACT)


with BuildPart() as cut_extrude2_tool:
    # Sketch18 → Cut-Extrude2 (new, through all)
    with BuildSketch(Plane.XY.offset(17.9)):
        with BuildLine():
            Line((305.3, 210.7), (305.3, 221.1))
            ThreePointArc((305.3, 221.1), (318, 233.8), (330.7, 221.1))
            Line((330.7, 221.1), (330.7, 210.7))
            ThreePointArc((330.7, 210.7), (318, 198), (305.3, 210.7))
        make_face()
    extrude(amount=-CUT_EXTRUDE2_DEPTH)


with BuildPart() as body_2_1:
    add(body_2.part)

    # Cut-Extrude2: cut by cut_extrude2_tool
    add(cut_extrude2_tool.part, mode=Mode.SUBTRACT)


with BuildPart() as body_4_1:
    add(body_4.part)

    # Cut-Extrude2: cut by cut_extrude2_tool
    add(cut_extrude2_tool.part, mode=Mode.SUBTRACT)


with BuildPart() as cut_extrude4_tool:
    # Sketch20 → Cut-Extrude4 (new body)
    with BuildSketch(Plane(origin=(0, 0, -17.9), x_dir=(-1, 0, 0), z_dir=(0, 0, -1)).offset(CUT_EXTRUDE4_START)):
        with BuildLine():
            Line((-337.05, 221.1), (-337.05, 210.7))
            ThreePointArc((-337.05, 210.7), (-318, 191.65), (-298.95, 210.7))
            Line((-298.95, 210.7), (-298.95, 221.1))
            ThreePointArc((-298.95, 221.1), (-318, 240.15), (-337.05, 221.1))
        make_face()
    extrude(amount=CUT_EXTRUDE4_DEPTH)


with BuildPart() as body_2_2:
    add(body_2_1.part)

    # Cut-Extrude4: cut by cut_extrude4_tool
    add(cut_extrude4_tool.part, mode=Mode.SUBTRACT)


with BuildPart() as body_4_2:
    add(body_4_1.part)

    # Cut-Extrude4: cut by cut_extrude4_tool
    add(cut_extrude4_tool.part, mode=Mode.SUBTRACT)


solid = Compound([part.part, body_3.part, body_5.part, body_2_2.part, body_4_2.part])
